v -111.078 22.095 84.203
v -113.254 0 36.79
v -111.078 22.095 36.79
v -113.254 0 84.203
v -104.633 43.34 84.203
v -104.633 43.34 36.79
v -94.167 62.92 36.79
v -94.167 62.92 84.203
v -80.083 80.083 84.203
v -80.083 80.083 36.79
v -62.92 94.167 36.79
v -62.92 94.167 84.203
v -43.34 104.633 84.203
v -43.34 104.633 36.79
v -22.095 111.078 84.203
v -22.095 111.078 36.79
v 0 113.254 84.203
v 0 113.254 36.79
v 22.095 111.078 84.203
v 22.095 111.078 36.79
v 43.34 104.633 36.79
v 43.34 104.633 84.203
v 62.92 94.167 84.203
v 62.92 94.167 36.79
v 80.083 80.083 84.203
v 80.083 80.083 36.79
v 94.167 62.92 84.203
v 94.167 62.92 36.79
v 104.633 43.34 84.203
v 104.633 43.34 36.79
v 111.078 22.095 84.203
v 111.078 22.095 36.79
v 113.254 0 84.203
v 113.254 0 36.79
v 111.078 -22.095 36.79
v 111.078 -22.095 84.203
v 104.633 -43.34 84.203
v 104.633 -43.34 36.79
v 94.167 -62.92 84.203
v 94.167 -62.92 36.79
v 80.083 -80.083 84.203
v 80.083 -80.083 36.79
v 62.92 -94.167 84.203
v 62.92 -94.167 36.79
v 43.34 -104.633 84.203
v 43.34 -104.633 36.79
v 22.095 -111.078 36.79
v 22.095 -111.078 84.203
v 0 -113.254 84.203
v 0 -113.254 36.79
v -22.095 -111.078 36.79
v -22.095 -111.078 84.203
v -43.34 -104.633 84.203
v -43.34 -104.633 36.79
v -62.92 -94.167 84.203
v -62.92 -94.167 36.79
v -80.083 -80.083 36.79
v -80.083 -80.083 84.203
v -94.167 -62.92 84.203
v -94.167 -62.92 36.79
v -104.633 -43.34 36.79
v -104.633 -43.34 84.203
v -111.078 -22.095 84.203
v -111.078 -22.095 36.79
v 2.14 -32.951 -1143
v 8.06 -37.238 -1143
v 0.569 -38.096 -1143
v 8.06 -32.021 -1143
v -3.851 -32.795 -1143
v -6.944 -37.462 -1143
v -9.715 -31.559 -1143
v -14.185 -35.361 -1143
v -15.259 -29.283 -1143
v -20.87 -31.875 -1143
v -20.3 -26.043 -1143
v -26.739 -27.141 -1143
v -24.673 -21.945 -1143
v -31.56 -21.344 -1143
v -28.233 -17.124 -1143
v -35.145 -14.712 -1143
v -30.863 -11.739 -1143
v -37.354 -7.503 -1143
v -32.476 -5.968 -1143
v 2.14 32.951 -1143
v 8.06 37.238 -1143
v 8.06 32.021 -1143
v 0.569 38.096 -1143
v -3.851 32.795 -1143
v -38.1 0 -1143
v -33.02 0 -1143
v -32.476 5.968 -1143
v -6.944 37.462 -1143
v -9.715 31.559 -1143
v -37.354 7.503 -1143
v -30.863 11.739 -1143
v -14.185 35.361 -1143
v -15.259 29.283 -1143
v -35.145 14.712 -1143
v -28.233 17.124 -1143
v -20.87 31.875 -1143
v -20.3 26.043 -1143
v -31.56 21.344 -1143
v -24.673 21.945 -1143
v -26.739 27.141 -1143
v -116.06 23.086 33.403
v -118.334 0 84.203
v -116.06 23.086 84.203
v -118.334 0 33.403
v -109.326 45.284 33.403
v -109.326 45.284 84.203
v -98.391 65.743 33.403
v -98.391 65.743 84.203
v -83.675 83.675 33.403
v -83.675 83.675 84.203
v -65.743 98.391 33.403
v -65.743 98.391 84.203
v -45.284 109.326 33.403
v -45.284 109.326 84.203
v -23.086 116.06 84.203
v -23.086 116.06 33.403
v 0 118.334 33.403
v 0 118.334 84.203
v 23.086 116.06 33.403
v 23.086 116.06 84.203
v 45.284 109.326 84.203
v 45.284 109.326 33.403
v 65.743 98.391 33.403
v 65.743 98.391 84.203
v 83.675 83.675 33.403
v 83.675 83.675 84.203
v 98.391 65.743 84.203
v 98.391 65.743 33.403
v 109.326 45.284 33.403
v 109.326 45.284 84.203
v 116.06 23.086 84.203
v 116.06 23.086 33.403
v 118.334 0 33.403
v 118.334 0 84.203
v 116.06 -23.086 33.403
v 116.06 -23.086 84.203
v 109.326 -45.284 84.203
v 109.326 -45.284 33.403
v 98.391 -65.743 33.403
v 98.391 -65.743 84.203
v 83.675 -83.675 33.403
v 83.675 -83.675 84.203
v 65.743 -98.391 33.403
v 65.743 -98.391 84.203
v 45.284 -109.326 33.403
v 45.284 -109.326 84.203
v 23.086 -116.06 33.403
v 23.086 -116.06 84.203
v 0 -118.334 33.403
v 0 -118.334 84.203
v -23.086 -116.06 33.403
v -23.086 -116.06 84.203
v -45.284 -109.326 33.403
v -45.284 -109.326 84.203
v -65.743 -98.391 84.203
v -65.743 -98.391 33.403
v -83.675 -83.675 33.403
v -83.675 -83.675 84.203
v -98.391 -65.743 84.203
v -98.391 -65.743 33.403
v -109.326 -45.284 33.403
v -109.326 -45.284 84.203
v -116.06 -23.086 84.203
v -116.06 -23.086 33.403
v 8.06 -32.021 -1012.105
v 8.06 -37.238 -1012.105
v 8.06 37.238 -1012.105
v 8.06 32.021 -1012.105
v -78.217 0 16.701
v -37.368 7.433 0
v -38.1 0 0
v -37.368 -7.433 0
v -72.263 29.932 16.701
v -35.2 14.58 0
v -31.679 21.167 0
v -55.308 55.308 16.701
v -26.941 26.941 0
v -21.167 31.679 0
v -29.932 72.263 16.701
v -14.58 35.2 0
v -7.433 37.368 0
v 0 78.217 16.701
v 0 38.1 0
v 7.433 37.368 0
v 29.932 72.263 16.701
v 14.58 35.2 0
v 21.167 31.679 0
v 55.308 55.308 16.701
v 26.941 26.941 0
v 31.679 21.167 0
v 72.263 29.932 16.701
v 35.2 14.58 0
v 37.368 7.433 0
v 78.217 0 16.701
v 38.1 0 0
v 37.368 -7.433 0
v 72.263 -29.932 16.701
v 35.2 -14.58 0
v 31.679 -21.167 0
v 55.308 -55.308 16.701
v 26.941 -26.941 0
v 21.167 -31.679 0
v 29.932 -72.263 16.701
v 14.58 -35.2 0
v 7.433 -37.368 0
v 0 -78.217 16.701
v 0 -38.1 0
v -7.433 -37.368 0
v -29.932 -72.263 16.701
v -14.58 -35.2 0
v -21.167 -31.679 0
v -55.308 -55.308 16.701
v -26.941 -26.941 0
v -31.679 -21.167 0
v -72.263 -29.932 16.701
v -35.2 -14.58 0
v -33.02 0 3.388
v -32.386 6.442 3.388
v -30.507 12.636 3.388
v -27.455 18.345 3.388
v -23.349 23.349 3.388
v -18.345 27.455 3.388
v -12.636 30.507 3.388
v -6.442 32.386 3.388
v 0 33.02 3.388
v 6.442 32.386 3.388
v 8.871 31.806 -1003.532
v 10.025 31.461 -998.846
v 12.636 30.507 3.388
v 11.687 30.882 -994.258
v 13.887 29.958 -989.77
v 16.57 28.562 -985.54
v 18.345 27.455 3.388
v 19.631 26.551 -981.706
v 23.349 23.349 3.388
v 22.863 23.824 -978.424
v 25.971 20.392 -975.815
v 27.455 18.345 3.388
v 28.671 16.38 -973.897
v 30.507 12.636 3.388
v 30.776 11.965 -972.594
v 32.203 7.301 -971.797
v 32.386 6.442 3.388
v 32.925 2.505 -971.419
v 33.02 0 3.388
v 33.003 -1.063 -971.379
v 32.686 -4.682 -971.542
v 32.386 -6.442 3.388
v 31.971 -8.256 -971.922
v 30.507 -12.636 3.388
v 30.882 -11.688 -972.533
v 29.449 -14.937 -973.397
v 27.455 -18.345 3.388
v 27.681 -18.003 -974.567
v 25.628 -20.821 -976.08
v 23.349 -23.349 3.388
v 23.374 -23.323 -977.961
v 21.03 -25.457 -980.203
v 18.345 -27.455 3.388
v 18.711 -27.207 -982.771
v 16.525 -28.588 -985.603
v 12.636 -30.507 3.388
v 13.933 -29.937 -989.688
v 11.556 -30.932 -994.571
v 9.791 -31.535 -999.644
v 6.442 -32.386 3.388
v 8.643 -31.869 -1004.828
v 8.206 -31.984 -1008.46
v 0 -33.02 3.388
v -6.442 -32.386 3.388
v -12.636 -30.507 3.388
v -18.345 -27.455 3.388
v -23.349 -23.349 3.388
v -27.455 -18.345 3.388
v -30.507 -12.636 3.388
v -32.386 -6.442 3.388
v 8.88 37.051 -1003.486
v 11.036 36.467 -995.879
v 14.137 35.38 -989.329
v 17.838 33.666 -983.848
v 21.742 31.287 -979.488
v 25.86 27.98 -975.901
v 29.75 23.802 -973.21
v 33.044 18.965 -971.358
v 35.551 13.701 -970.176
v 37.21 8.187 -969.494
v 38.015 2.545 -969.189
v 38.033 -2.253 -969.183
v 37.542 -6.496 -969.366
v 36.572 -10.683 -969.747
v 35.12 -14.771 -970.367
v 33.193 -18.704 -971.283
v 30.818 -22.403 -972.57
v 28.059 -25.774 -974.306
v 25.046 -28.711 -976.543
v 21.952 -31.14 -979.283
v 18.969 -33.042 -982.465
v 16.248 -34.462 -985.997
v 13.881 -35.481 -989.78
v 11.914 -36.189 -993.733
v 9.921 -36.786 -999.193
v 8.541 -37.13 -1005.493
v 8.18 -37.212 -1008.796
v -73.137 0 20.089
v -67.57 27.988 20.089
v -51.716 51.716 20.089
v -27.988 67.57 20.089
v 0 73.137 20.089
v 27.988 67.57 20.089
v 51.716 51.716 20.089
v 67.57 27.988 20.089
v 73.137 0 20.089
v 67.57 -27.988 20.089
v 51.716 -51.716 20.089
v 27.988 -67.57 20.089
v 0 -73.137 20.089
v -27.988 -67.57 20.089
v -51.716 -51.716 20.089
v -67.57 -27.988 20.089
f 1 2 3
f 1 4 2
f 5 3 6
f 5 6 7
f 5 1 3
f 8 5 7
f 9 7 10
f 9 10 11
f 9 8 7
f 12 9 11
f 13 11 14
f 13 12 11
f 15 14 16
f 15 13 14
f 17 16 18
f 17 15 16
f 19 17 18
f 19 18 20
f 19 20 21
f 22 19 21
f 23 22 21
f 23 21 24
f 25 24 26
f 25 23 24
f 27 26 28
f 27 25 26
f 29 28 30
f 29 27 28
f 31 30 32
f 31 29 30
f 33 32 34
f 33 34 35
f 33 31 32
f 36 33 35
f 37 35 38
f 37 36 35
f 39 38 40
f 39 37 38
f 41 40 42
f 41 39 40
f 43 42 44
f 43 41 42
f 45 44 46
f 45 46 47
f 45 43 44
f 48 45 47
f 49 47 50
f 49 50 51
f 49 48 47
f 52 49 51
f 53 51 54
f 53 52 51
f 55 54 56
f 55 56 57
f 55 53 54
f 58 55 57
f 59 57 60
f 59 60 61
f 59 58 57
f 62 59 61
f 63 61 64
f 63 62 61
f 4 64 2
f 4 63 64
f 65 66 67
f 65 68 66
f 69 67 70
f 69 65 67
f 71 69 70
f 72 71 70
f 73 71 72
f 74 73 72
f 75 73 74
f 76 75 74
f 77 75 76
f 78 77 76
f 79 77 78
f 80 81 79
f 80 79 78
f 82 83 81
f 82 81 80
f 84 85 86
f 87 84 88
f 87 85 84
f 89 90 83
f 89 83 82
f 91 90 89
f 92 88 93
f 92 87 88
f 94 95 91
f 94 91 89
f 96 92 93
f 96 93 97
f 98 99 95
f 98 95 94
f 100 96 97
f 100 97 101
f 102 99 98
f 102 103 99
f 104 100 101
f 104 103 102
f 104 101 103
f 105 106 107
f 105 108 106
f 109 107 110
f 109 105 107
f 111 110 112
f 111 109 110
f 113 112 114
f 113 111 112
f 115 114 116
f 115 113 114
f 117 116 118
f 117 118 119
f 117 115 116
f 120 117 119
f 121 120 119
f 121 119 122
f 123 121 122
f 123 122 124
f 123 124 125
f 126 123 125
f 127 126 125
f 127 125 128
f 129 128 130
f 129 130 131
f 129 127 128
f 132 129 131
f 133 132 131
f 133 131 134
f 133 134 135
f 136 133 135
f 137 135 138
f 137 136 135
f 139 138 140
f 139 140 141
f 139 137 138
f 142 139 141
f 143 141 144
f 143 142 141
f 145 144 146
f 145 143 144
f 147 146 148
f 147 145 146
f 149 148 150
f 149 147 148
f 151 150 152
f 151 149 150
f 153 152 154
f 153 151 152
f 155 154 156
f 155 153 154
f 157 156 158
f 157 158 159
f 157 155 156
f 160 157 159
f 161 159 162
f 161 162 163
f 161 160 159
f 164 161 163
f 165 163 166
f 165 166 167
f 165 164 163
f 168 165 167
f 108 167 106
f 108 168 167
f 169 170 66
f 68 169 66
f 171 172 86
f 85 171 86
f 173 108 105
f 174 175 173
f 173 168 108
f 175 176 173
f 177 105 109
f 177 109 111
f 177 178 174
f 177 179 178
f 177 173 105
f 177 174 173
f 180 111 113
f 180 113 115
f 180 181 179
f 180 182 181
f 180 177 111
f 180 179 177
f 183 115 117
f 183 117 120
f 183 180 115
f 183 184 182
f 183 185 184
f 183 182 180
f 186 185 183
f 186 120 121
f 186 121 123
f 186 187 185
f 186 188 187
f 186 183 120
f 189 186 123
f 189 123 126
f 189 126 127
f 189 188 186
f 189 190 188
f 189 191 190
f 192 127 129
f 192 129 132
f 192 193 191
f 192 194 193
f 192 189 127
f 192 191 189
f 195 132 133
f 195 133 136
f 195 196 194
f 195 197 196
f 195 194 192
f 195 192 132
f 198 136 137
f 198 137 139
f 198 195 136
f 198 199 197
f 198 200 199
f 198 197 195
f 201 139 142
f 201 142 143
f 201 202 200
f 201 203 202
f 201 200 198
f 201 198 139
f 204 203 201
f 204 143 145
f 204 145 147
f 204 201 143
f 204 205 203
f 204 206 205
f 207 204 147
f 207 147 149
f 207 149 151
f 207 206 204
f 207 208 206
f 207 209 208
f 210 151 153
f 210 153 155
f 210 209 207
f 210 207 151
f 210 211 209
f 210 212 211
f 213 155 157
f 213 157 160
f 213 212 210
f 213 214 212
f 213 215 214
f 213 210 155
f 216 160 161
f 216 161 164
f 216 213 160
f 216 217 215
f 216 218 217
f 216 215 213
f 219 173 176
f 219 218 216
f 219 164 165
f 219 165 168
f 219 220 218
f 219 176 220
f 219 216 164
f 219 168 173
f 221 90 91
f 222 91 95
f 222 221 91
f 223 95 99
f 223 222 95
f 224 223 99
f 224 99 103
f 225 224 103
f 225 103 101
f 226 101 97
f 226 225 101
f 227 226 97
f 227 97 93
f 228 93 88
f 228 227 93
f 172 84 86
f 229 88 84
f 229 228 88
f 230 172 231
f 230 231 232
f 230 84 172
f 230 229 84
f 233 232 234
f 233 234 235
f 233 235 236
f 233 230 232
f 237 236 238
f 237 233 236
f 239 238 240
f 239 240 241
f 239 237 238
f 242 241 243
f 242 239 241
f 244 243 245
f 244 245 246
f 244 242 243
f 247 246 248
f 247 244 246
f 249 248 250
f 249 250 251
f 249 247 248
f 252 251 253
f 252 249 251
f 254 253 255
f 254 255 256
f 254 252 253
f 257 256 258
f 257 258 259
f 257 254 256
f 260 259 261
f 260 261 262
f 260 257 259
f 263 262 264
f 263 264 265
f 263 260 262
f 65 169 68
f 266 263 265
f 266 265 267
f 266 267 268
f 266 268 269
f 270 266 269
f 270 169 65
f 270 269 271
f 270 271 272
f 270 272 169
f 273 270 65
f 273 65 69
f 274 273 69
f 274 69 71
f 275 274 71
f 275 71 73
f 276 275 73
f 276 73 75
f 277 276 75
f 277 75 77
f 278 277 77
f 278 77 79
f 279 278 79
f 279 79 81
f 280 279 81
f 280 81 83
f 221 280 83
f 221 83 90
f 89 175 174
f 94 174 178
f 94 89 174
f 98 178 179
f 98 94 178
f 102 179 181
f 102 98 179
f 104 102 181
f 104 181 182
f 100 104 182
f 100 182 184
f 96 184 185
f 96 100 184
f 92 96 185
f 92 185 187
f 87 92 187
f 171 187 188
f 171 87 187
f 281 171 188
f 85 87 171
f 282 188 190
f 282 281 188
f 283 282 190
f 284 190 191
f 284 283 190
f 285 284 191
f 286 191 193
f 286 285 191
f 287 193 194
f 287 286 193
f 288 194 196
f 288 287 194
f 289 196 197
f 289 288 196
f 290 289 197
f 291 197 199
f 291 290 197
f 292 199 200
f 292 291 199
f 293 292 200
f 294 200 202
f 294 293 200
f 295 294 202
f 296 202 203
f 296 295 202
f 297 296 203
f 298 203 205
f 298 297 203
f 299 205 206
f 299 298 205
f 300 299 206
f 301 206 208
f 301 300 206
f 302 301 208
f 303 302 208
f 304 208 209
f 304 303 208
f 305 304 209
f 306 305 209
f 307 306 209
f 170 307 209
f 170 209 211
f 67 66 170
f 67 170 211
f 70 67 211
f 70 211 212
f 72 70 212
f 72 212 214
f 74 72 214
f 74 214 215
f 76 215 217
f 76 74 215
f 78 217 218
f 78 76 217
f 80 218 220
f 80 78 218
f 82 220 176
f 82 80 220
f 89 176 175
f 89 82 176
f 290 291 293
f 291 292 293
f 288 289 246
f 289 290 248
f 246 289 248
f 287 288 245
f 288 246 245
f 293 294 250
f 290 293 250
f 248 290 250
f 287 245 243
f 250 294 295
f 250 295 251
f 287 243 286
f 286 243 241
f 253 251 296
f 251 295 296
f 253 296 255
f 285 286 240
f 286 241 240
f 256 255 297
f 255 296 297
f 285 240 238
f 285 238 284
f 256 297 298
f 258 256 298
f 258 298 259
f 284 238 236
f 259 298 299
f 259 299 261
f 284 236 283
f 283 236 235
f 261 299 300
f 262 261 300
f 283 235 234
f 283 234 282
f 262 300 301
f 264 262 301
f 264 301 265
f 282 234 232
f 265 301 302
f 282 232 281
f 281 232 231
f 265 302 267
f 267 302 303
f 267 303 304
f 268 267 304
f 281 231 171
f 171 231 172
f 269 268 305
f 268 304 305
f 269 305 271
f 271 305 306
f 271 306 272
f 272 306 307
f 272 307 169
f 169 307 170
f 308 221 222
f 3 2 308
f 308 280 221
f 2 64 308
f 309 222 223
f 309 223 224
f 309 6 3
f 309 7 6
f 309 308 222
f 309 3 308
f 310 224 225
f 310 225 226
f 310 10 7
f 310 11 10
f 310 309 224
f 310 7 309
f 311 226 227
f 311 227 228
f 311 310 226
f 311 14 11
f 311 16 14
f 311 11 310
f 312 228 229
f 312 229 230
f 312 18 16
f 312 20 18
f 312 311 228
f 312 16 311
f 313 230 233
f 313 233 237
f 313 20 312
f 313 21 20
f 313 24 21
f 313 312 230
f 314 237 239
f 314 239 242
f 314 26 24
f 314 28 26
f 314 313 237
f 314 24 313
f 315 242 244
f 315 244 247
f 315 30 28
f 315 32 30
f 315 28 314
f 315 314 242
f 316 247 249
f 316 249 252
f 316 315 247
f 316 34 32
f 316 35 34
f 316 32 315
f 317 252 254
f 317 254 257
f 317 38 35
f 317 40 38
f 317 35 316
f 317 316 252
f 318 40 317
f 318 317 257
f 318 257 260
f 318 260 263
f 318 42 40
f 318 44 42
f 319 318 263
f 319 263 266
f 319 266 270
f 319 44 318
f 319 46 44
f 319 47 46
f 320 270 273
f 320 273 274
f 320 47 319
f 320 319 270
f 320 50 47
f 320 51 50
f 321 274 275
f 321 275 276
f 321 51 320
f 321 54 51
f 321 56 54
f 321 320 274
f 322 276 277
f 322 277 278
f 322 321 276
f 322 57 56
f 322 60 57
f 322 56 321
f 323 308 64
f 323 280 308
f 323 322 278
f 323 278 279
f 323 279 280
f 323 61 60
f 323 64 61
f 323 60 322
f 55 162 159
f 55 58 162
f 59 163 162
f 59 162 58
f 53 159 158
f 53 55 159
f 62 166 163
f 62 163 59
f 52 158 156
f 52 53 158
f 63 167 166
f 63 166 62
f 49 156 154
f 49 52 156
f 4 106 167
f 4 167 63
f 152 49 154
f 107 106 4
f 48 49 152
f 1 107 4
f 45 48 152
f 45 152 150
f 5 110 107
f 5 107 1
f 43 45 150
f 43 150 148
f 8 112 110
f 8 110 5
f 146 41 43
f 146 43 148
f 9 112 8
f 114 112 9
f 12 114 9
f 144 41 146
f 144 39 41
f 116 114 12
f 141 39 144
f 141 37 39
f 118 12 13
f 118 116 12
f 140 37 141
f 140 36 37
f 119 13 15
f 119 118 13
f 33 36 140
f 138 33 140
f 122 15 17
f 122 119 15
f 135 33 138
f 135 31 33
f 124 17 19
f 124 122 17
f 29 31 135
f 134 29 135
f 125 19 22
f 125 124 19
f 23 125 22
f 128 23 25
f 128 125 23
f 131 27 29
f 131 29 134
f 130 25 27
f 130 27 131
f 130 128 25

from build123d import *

# Parameters (mm, degrees)
F3_DEPTH = 63.5


with BuildPart() as f1:
    # F0 (on Front) → F1 (revolve)
    with BuildSketch(Plane.XZ):
        Polygon((-113.253824, 36.790495), (-113.253824, 84.202737), (-118.333824, 84.202737), (-118.333824, 33.402737), (-38.1, 0), (-38.1, -1143), (-33.02, -1143), (-33.02, 3.387759), align=None)
    revolve(axis=Axis((0, 0, -529.398632), (0, 0, -1)))

    # F2 (on Front) → F3 (cut, symmetric)
    with BuildSketch(Plane.XZ):
        with BuildLine():
            Line((8.060034, -1012.105305), (8.060034, -1153.510451))
            Line((8.060034, -1153.510451), (58.457147, -1153.510451))
            Line((58.457147, -1153.510451), (58.457147, -966.385305))
            Line((58.457147, -966.385305), (53.780034, -966.385305))
            ThreePointArc((53.780034, -966.385305), (21.451112, -979.776383), (8.060034, -1012.105305))
        make_face()
    extrude(amount=F3_DEPTH, both=True, mode=Mode.SUBTRACT)


solid = f1.part
